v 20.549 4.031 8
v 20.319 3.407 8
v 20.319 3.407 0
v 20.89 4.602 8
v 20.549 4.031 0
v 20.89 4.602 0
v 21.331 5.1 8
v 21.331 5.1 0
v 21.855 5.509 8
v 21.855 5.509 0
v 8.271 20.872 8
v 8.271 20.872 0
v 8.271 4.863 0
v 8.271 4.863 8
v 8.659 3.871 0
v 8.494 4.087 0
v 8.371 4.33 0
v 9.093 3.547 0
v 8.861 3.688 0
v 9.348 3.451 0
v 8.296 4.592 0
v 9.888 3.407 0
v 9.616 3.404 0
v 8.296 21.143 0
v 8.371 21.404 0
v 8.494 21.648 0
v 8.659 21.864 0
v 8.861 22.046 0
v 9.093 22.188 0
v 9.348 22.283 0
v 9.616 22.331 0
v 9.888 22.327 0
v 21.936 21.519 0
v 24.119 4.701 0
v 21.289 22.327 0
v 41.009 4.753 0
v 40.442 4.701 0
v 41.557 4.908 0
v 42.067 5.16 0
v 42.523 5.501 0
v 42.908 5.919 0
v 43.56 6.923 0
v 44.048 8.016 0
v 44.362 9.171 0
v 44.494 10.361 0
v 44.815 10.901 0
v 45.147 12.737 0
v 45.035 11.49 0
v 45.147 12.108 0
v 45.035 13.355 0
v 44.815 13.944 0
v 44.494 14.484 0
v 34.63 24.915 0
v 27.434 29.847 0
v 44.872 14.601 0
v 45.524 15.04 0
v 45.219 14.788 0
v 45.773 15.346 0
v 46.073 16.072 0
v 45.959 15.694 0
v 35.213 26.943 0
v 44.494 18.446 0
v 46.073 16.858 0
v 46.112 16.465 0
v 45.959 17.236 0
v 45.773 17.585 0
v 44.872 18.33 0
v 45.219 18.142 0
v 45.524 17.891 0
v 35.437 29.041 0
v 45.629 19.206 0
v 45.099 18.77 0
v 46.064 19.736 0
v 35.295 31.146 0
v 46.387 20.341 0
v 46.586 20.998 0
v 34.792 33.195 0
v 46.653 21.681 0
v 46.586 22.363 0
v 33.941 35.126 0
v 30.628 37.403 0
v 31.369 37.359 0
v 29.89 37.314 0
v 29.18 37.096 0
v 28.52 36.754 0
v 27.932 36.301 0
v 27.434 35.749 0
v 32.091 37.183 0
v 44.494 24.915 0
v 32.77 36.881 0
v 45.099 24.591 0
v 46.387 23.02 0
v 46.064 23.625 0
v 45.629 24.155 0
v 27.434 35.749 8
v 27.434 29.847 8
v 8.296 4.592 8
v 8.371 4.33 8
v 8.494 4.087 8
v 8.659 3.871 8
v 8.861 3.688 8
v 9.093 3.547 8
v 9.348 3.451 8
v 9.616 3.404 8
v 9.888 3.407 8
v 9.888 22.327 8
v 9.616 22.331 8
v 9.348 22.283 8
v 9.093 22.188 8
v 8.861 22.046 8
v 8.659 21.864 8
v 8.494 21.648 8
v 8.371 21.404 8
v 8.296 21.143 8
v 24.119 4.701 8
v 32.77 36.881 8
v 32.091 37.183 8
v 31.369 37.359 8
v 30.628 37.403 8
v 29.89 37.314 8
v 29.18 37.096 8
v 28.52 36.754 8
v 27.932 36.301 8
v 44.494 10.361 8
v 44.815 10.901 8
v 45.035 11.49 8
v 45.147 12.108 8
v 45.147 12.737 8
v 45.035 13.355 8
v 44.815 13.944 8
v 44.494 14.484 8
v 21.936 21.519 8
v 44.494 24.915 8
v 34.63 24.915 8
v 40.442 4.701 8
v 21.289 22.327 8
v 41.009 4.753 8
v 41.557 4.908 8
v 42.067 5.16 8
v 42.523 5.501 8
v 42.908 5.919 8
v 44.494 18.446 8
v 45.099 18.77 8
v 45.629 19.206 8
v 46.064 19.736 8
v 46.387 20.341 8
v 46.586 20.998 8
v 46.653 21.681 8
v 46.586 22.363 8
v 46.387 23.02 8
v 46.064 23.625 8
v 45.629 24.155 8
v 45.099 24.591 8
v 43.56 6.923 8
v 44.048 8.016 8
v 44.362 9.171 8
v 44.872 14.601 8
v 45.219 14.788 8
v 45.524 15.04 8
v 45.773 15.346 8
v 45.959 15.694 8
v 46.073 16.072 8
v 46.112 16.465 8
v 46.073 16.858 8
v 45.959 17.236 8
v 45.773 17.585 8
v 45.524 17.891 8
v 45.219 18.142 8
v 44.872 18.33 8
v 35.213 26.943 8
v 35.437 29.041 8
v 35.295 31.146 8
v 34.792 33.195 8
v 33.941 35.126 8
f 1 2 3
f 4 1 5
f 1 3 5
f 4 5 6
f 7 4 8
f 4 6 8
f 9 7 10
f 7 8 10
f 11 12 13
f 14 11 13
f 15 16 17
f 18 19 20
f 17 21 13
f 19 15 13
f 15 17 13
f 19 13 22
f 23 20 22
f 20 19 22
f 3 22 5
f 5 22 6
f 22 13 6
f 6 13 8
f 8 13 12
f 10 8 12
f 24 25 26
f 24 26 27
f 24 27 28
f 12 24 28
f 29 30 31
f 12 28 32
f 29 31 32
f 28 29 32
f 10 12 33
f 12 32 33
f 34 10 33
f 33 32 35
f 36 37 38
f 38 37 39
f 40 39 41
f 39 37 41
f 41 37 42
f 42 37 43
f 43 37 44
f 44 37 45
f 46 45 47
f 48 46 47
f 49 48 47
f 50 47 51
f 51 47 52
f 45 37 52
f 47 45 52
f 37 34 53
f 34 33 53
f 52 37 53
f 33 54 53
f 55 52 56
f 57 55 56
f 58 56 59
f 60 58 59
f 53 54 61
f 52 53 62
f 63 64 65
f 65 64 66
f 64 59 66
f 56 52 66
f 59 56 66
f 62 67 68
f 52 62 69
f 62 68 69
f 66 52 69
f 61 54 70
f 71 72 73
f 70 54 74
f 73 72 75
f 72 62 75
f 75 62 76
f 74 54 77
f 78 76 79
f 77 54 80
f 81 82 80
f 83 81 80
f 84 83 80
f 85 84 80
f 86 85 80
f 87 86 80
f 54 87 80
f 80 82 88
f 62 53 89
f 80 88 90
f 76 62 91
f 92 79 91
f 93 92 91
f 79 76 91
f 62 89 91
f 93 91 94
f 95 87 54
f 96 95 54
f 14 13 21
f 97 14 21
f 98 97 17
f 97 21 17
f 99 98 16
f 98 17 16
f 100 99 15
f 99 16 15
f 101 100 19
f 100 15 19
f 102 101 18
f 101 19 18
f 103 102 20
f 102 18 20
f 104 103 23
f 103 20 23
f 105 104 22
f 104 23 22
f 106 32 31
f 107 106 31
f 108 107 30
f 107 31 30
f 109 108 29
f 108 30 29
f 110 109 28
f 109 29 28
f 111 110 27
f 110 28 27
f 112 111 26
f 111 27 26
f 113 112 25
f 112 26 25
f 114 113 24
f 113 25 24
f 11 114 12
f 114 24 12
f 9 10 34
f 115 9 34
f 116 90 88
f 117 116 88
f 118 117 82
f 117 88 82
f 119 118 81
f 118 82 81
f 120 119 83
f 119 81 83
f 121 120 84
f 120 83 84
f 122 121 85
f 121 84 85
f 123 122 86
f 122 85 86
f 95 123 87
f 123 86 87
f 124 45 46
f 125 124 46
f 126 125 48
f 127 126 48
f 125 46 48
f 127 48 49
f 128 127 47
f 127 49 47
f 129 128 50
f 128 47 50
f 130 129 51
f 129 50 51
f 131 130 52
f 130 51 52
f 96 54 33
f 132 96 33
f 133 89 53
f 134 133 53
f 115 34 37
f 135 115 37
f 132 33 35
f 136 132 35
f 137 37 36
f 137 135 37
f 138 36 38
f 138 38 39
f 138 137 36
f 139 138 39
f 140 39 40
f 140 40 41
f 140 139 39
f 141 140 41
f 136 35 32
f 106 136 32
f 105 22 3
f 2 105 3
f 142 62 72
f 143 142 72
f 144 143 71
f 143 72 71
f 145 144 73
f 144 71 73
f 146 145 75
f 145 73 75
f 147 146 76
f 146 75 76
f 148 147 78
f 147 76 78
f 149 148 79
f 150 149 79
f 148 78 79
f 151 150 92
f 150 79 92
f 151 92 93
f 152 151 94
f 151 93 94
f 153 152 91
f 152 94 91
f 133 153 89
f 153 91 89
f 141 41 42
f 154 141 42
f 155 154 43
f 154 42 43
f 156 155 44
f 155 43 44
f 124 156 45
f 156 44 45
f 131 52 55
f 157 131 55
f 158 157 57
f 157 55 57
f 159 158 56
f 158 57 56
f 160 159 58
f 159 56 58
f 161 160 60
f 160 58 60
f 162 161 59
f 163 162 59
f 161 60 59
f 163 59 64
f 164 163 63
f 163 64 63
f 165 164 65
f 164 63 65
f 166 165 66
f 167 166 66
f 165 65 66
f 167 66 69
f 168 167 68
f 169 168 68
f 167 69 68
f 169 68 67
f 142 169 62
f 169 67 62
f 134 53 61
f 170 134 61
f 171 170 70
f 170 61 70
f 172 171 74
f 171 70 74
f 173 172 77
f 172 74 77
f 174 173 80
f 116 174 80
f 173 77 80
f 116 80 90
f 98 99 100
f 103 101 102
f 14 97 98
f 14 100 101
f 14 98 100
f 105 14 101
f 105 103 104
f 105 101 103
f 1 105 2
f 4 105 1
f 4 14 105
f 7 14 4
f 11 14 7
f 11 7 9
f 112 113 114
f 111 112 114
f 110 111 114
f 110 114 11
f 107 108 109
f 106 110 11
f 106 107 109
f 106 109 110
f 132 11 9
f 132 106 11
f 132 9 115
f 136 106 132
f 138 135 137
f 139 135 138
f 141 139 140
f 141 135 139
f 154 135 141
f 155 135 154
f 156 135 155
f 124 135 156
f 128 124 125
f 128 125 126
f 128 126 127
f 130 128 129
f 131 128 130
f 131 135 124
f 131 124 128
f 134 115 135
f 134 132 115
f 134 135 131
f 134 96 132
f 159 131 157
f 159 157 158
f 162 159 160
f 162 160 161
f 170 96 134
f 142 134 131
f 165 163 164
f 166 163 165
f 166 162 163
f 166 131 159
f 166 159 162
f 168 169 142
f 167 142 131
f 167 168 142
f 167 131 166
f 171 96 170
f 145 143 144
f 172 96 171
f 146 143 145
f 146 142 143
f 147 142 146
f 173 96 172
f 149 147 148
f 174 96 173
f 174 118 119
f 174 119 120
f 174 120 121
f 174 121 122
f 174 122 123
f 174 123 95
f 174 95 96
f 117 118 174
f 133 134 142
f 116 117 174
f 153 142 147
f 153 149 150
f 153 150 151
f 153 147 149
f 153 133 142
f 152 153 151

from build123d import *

# Parameters (mm, degrees)
F1_DEPTH = 8
F2_R     = 3.104738


with BuildPart() as f1:
    # F0 (on Top) → F1 (new body)
    with BuildSketch(Plane.XY):
        with BuildLine():
            ThreePointArc((9.888176, 22.327356), (8.755531, 21.959757), (8.271066, 20.871958))
            Line((8.271066, 20.871958), (8.271066, 4.862583))
            ThreePointArc((8.271066, 4.862583), (8.755531, 3.774784), (9.888176, 3.407185))
            Line((9.888176, 3.407185), (20.318527, 3.407185))
            ThreePointArc((20.318527, 3.407185), (20.890308, 4.601787), (21.854779, 5.509426))
            Line((21.854779, 5.509426), (24.118731, 4.700872))
            Line((24.118731, 4.700872), (41.745216, 4.700872))
            ThreePointArc((41.745216, 4.700872), (43.721863, 7.238361), (44.494297, 10.360752))
            ThreePointArc((44.494297, 10.360752), (45.161115, 12.422565), (44.494297, 14.484379))
            ThreePointArc((44.494297, 14.484379), (46.111809, 16.465337), (44.494297, 18.446295))
            ThreePointArc((44.494297, 18.446295), (46.652767, 21.680512), (44.494297, 24.914728))
            Line((44.494297, 24.914728), (34.629937, 24.914728))
            ThreePointArc((34.629937, 24.914728), (35.295258, 31.145926), (32.770261, 36.881331))
            ThreePointArc((32.770261, 36.881331), (29.89011, 37.31441), (27.433803, 35.749357))
            Line((27.433803, 35.749357), (27.433803, 29.84691))
            Line((27.433803, 29.84691), (21.935634, 21.5188))
            Line((21.935634, 21.5188), (21.288792, 22.327356))
            Line((21.288792, 22.327356), (9.888176, 22.327356))
        make_face()
    extrude(amount=F1_DEPTH)

    # F2
    f2_edges = [f1.edges().sort_by_distance(p)[0] for p in [
        (41.745216, 4.700872, 4),
    ]]
    fillet(f2_edges, radius=F2_R)


solid = f1.part
